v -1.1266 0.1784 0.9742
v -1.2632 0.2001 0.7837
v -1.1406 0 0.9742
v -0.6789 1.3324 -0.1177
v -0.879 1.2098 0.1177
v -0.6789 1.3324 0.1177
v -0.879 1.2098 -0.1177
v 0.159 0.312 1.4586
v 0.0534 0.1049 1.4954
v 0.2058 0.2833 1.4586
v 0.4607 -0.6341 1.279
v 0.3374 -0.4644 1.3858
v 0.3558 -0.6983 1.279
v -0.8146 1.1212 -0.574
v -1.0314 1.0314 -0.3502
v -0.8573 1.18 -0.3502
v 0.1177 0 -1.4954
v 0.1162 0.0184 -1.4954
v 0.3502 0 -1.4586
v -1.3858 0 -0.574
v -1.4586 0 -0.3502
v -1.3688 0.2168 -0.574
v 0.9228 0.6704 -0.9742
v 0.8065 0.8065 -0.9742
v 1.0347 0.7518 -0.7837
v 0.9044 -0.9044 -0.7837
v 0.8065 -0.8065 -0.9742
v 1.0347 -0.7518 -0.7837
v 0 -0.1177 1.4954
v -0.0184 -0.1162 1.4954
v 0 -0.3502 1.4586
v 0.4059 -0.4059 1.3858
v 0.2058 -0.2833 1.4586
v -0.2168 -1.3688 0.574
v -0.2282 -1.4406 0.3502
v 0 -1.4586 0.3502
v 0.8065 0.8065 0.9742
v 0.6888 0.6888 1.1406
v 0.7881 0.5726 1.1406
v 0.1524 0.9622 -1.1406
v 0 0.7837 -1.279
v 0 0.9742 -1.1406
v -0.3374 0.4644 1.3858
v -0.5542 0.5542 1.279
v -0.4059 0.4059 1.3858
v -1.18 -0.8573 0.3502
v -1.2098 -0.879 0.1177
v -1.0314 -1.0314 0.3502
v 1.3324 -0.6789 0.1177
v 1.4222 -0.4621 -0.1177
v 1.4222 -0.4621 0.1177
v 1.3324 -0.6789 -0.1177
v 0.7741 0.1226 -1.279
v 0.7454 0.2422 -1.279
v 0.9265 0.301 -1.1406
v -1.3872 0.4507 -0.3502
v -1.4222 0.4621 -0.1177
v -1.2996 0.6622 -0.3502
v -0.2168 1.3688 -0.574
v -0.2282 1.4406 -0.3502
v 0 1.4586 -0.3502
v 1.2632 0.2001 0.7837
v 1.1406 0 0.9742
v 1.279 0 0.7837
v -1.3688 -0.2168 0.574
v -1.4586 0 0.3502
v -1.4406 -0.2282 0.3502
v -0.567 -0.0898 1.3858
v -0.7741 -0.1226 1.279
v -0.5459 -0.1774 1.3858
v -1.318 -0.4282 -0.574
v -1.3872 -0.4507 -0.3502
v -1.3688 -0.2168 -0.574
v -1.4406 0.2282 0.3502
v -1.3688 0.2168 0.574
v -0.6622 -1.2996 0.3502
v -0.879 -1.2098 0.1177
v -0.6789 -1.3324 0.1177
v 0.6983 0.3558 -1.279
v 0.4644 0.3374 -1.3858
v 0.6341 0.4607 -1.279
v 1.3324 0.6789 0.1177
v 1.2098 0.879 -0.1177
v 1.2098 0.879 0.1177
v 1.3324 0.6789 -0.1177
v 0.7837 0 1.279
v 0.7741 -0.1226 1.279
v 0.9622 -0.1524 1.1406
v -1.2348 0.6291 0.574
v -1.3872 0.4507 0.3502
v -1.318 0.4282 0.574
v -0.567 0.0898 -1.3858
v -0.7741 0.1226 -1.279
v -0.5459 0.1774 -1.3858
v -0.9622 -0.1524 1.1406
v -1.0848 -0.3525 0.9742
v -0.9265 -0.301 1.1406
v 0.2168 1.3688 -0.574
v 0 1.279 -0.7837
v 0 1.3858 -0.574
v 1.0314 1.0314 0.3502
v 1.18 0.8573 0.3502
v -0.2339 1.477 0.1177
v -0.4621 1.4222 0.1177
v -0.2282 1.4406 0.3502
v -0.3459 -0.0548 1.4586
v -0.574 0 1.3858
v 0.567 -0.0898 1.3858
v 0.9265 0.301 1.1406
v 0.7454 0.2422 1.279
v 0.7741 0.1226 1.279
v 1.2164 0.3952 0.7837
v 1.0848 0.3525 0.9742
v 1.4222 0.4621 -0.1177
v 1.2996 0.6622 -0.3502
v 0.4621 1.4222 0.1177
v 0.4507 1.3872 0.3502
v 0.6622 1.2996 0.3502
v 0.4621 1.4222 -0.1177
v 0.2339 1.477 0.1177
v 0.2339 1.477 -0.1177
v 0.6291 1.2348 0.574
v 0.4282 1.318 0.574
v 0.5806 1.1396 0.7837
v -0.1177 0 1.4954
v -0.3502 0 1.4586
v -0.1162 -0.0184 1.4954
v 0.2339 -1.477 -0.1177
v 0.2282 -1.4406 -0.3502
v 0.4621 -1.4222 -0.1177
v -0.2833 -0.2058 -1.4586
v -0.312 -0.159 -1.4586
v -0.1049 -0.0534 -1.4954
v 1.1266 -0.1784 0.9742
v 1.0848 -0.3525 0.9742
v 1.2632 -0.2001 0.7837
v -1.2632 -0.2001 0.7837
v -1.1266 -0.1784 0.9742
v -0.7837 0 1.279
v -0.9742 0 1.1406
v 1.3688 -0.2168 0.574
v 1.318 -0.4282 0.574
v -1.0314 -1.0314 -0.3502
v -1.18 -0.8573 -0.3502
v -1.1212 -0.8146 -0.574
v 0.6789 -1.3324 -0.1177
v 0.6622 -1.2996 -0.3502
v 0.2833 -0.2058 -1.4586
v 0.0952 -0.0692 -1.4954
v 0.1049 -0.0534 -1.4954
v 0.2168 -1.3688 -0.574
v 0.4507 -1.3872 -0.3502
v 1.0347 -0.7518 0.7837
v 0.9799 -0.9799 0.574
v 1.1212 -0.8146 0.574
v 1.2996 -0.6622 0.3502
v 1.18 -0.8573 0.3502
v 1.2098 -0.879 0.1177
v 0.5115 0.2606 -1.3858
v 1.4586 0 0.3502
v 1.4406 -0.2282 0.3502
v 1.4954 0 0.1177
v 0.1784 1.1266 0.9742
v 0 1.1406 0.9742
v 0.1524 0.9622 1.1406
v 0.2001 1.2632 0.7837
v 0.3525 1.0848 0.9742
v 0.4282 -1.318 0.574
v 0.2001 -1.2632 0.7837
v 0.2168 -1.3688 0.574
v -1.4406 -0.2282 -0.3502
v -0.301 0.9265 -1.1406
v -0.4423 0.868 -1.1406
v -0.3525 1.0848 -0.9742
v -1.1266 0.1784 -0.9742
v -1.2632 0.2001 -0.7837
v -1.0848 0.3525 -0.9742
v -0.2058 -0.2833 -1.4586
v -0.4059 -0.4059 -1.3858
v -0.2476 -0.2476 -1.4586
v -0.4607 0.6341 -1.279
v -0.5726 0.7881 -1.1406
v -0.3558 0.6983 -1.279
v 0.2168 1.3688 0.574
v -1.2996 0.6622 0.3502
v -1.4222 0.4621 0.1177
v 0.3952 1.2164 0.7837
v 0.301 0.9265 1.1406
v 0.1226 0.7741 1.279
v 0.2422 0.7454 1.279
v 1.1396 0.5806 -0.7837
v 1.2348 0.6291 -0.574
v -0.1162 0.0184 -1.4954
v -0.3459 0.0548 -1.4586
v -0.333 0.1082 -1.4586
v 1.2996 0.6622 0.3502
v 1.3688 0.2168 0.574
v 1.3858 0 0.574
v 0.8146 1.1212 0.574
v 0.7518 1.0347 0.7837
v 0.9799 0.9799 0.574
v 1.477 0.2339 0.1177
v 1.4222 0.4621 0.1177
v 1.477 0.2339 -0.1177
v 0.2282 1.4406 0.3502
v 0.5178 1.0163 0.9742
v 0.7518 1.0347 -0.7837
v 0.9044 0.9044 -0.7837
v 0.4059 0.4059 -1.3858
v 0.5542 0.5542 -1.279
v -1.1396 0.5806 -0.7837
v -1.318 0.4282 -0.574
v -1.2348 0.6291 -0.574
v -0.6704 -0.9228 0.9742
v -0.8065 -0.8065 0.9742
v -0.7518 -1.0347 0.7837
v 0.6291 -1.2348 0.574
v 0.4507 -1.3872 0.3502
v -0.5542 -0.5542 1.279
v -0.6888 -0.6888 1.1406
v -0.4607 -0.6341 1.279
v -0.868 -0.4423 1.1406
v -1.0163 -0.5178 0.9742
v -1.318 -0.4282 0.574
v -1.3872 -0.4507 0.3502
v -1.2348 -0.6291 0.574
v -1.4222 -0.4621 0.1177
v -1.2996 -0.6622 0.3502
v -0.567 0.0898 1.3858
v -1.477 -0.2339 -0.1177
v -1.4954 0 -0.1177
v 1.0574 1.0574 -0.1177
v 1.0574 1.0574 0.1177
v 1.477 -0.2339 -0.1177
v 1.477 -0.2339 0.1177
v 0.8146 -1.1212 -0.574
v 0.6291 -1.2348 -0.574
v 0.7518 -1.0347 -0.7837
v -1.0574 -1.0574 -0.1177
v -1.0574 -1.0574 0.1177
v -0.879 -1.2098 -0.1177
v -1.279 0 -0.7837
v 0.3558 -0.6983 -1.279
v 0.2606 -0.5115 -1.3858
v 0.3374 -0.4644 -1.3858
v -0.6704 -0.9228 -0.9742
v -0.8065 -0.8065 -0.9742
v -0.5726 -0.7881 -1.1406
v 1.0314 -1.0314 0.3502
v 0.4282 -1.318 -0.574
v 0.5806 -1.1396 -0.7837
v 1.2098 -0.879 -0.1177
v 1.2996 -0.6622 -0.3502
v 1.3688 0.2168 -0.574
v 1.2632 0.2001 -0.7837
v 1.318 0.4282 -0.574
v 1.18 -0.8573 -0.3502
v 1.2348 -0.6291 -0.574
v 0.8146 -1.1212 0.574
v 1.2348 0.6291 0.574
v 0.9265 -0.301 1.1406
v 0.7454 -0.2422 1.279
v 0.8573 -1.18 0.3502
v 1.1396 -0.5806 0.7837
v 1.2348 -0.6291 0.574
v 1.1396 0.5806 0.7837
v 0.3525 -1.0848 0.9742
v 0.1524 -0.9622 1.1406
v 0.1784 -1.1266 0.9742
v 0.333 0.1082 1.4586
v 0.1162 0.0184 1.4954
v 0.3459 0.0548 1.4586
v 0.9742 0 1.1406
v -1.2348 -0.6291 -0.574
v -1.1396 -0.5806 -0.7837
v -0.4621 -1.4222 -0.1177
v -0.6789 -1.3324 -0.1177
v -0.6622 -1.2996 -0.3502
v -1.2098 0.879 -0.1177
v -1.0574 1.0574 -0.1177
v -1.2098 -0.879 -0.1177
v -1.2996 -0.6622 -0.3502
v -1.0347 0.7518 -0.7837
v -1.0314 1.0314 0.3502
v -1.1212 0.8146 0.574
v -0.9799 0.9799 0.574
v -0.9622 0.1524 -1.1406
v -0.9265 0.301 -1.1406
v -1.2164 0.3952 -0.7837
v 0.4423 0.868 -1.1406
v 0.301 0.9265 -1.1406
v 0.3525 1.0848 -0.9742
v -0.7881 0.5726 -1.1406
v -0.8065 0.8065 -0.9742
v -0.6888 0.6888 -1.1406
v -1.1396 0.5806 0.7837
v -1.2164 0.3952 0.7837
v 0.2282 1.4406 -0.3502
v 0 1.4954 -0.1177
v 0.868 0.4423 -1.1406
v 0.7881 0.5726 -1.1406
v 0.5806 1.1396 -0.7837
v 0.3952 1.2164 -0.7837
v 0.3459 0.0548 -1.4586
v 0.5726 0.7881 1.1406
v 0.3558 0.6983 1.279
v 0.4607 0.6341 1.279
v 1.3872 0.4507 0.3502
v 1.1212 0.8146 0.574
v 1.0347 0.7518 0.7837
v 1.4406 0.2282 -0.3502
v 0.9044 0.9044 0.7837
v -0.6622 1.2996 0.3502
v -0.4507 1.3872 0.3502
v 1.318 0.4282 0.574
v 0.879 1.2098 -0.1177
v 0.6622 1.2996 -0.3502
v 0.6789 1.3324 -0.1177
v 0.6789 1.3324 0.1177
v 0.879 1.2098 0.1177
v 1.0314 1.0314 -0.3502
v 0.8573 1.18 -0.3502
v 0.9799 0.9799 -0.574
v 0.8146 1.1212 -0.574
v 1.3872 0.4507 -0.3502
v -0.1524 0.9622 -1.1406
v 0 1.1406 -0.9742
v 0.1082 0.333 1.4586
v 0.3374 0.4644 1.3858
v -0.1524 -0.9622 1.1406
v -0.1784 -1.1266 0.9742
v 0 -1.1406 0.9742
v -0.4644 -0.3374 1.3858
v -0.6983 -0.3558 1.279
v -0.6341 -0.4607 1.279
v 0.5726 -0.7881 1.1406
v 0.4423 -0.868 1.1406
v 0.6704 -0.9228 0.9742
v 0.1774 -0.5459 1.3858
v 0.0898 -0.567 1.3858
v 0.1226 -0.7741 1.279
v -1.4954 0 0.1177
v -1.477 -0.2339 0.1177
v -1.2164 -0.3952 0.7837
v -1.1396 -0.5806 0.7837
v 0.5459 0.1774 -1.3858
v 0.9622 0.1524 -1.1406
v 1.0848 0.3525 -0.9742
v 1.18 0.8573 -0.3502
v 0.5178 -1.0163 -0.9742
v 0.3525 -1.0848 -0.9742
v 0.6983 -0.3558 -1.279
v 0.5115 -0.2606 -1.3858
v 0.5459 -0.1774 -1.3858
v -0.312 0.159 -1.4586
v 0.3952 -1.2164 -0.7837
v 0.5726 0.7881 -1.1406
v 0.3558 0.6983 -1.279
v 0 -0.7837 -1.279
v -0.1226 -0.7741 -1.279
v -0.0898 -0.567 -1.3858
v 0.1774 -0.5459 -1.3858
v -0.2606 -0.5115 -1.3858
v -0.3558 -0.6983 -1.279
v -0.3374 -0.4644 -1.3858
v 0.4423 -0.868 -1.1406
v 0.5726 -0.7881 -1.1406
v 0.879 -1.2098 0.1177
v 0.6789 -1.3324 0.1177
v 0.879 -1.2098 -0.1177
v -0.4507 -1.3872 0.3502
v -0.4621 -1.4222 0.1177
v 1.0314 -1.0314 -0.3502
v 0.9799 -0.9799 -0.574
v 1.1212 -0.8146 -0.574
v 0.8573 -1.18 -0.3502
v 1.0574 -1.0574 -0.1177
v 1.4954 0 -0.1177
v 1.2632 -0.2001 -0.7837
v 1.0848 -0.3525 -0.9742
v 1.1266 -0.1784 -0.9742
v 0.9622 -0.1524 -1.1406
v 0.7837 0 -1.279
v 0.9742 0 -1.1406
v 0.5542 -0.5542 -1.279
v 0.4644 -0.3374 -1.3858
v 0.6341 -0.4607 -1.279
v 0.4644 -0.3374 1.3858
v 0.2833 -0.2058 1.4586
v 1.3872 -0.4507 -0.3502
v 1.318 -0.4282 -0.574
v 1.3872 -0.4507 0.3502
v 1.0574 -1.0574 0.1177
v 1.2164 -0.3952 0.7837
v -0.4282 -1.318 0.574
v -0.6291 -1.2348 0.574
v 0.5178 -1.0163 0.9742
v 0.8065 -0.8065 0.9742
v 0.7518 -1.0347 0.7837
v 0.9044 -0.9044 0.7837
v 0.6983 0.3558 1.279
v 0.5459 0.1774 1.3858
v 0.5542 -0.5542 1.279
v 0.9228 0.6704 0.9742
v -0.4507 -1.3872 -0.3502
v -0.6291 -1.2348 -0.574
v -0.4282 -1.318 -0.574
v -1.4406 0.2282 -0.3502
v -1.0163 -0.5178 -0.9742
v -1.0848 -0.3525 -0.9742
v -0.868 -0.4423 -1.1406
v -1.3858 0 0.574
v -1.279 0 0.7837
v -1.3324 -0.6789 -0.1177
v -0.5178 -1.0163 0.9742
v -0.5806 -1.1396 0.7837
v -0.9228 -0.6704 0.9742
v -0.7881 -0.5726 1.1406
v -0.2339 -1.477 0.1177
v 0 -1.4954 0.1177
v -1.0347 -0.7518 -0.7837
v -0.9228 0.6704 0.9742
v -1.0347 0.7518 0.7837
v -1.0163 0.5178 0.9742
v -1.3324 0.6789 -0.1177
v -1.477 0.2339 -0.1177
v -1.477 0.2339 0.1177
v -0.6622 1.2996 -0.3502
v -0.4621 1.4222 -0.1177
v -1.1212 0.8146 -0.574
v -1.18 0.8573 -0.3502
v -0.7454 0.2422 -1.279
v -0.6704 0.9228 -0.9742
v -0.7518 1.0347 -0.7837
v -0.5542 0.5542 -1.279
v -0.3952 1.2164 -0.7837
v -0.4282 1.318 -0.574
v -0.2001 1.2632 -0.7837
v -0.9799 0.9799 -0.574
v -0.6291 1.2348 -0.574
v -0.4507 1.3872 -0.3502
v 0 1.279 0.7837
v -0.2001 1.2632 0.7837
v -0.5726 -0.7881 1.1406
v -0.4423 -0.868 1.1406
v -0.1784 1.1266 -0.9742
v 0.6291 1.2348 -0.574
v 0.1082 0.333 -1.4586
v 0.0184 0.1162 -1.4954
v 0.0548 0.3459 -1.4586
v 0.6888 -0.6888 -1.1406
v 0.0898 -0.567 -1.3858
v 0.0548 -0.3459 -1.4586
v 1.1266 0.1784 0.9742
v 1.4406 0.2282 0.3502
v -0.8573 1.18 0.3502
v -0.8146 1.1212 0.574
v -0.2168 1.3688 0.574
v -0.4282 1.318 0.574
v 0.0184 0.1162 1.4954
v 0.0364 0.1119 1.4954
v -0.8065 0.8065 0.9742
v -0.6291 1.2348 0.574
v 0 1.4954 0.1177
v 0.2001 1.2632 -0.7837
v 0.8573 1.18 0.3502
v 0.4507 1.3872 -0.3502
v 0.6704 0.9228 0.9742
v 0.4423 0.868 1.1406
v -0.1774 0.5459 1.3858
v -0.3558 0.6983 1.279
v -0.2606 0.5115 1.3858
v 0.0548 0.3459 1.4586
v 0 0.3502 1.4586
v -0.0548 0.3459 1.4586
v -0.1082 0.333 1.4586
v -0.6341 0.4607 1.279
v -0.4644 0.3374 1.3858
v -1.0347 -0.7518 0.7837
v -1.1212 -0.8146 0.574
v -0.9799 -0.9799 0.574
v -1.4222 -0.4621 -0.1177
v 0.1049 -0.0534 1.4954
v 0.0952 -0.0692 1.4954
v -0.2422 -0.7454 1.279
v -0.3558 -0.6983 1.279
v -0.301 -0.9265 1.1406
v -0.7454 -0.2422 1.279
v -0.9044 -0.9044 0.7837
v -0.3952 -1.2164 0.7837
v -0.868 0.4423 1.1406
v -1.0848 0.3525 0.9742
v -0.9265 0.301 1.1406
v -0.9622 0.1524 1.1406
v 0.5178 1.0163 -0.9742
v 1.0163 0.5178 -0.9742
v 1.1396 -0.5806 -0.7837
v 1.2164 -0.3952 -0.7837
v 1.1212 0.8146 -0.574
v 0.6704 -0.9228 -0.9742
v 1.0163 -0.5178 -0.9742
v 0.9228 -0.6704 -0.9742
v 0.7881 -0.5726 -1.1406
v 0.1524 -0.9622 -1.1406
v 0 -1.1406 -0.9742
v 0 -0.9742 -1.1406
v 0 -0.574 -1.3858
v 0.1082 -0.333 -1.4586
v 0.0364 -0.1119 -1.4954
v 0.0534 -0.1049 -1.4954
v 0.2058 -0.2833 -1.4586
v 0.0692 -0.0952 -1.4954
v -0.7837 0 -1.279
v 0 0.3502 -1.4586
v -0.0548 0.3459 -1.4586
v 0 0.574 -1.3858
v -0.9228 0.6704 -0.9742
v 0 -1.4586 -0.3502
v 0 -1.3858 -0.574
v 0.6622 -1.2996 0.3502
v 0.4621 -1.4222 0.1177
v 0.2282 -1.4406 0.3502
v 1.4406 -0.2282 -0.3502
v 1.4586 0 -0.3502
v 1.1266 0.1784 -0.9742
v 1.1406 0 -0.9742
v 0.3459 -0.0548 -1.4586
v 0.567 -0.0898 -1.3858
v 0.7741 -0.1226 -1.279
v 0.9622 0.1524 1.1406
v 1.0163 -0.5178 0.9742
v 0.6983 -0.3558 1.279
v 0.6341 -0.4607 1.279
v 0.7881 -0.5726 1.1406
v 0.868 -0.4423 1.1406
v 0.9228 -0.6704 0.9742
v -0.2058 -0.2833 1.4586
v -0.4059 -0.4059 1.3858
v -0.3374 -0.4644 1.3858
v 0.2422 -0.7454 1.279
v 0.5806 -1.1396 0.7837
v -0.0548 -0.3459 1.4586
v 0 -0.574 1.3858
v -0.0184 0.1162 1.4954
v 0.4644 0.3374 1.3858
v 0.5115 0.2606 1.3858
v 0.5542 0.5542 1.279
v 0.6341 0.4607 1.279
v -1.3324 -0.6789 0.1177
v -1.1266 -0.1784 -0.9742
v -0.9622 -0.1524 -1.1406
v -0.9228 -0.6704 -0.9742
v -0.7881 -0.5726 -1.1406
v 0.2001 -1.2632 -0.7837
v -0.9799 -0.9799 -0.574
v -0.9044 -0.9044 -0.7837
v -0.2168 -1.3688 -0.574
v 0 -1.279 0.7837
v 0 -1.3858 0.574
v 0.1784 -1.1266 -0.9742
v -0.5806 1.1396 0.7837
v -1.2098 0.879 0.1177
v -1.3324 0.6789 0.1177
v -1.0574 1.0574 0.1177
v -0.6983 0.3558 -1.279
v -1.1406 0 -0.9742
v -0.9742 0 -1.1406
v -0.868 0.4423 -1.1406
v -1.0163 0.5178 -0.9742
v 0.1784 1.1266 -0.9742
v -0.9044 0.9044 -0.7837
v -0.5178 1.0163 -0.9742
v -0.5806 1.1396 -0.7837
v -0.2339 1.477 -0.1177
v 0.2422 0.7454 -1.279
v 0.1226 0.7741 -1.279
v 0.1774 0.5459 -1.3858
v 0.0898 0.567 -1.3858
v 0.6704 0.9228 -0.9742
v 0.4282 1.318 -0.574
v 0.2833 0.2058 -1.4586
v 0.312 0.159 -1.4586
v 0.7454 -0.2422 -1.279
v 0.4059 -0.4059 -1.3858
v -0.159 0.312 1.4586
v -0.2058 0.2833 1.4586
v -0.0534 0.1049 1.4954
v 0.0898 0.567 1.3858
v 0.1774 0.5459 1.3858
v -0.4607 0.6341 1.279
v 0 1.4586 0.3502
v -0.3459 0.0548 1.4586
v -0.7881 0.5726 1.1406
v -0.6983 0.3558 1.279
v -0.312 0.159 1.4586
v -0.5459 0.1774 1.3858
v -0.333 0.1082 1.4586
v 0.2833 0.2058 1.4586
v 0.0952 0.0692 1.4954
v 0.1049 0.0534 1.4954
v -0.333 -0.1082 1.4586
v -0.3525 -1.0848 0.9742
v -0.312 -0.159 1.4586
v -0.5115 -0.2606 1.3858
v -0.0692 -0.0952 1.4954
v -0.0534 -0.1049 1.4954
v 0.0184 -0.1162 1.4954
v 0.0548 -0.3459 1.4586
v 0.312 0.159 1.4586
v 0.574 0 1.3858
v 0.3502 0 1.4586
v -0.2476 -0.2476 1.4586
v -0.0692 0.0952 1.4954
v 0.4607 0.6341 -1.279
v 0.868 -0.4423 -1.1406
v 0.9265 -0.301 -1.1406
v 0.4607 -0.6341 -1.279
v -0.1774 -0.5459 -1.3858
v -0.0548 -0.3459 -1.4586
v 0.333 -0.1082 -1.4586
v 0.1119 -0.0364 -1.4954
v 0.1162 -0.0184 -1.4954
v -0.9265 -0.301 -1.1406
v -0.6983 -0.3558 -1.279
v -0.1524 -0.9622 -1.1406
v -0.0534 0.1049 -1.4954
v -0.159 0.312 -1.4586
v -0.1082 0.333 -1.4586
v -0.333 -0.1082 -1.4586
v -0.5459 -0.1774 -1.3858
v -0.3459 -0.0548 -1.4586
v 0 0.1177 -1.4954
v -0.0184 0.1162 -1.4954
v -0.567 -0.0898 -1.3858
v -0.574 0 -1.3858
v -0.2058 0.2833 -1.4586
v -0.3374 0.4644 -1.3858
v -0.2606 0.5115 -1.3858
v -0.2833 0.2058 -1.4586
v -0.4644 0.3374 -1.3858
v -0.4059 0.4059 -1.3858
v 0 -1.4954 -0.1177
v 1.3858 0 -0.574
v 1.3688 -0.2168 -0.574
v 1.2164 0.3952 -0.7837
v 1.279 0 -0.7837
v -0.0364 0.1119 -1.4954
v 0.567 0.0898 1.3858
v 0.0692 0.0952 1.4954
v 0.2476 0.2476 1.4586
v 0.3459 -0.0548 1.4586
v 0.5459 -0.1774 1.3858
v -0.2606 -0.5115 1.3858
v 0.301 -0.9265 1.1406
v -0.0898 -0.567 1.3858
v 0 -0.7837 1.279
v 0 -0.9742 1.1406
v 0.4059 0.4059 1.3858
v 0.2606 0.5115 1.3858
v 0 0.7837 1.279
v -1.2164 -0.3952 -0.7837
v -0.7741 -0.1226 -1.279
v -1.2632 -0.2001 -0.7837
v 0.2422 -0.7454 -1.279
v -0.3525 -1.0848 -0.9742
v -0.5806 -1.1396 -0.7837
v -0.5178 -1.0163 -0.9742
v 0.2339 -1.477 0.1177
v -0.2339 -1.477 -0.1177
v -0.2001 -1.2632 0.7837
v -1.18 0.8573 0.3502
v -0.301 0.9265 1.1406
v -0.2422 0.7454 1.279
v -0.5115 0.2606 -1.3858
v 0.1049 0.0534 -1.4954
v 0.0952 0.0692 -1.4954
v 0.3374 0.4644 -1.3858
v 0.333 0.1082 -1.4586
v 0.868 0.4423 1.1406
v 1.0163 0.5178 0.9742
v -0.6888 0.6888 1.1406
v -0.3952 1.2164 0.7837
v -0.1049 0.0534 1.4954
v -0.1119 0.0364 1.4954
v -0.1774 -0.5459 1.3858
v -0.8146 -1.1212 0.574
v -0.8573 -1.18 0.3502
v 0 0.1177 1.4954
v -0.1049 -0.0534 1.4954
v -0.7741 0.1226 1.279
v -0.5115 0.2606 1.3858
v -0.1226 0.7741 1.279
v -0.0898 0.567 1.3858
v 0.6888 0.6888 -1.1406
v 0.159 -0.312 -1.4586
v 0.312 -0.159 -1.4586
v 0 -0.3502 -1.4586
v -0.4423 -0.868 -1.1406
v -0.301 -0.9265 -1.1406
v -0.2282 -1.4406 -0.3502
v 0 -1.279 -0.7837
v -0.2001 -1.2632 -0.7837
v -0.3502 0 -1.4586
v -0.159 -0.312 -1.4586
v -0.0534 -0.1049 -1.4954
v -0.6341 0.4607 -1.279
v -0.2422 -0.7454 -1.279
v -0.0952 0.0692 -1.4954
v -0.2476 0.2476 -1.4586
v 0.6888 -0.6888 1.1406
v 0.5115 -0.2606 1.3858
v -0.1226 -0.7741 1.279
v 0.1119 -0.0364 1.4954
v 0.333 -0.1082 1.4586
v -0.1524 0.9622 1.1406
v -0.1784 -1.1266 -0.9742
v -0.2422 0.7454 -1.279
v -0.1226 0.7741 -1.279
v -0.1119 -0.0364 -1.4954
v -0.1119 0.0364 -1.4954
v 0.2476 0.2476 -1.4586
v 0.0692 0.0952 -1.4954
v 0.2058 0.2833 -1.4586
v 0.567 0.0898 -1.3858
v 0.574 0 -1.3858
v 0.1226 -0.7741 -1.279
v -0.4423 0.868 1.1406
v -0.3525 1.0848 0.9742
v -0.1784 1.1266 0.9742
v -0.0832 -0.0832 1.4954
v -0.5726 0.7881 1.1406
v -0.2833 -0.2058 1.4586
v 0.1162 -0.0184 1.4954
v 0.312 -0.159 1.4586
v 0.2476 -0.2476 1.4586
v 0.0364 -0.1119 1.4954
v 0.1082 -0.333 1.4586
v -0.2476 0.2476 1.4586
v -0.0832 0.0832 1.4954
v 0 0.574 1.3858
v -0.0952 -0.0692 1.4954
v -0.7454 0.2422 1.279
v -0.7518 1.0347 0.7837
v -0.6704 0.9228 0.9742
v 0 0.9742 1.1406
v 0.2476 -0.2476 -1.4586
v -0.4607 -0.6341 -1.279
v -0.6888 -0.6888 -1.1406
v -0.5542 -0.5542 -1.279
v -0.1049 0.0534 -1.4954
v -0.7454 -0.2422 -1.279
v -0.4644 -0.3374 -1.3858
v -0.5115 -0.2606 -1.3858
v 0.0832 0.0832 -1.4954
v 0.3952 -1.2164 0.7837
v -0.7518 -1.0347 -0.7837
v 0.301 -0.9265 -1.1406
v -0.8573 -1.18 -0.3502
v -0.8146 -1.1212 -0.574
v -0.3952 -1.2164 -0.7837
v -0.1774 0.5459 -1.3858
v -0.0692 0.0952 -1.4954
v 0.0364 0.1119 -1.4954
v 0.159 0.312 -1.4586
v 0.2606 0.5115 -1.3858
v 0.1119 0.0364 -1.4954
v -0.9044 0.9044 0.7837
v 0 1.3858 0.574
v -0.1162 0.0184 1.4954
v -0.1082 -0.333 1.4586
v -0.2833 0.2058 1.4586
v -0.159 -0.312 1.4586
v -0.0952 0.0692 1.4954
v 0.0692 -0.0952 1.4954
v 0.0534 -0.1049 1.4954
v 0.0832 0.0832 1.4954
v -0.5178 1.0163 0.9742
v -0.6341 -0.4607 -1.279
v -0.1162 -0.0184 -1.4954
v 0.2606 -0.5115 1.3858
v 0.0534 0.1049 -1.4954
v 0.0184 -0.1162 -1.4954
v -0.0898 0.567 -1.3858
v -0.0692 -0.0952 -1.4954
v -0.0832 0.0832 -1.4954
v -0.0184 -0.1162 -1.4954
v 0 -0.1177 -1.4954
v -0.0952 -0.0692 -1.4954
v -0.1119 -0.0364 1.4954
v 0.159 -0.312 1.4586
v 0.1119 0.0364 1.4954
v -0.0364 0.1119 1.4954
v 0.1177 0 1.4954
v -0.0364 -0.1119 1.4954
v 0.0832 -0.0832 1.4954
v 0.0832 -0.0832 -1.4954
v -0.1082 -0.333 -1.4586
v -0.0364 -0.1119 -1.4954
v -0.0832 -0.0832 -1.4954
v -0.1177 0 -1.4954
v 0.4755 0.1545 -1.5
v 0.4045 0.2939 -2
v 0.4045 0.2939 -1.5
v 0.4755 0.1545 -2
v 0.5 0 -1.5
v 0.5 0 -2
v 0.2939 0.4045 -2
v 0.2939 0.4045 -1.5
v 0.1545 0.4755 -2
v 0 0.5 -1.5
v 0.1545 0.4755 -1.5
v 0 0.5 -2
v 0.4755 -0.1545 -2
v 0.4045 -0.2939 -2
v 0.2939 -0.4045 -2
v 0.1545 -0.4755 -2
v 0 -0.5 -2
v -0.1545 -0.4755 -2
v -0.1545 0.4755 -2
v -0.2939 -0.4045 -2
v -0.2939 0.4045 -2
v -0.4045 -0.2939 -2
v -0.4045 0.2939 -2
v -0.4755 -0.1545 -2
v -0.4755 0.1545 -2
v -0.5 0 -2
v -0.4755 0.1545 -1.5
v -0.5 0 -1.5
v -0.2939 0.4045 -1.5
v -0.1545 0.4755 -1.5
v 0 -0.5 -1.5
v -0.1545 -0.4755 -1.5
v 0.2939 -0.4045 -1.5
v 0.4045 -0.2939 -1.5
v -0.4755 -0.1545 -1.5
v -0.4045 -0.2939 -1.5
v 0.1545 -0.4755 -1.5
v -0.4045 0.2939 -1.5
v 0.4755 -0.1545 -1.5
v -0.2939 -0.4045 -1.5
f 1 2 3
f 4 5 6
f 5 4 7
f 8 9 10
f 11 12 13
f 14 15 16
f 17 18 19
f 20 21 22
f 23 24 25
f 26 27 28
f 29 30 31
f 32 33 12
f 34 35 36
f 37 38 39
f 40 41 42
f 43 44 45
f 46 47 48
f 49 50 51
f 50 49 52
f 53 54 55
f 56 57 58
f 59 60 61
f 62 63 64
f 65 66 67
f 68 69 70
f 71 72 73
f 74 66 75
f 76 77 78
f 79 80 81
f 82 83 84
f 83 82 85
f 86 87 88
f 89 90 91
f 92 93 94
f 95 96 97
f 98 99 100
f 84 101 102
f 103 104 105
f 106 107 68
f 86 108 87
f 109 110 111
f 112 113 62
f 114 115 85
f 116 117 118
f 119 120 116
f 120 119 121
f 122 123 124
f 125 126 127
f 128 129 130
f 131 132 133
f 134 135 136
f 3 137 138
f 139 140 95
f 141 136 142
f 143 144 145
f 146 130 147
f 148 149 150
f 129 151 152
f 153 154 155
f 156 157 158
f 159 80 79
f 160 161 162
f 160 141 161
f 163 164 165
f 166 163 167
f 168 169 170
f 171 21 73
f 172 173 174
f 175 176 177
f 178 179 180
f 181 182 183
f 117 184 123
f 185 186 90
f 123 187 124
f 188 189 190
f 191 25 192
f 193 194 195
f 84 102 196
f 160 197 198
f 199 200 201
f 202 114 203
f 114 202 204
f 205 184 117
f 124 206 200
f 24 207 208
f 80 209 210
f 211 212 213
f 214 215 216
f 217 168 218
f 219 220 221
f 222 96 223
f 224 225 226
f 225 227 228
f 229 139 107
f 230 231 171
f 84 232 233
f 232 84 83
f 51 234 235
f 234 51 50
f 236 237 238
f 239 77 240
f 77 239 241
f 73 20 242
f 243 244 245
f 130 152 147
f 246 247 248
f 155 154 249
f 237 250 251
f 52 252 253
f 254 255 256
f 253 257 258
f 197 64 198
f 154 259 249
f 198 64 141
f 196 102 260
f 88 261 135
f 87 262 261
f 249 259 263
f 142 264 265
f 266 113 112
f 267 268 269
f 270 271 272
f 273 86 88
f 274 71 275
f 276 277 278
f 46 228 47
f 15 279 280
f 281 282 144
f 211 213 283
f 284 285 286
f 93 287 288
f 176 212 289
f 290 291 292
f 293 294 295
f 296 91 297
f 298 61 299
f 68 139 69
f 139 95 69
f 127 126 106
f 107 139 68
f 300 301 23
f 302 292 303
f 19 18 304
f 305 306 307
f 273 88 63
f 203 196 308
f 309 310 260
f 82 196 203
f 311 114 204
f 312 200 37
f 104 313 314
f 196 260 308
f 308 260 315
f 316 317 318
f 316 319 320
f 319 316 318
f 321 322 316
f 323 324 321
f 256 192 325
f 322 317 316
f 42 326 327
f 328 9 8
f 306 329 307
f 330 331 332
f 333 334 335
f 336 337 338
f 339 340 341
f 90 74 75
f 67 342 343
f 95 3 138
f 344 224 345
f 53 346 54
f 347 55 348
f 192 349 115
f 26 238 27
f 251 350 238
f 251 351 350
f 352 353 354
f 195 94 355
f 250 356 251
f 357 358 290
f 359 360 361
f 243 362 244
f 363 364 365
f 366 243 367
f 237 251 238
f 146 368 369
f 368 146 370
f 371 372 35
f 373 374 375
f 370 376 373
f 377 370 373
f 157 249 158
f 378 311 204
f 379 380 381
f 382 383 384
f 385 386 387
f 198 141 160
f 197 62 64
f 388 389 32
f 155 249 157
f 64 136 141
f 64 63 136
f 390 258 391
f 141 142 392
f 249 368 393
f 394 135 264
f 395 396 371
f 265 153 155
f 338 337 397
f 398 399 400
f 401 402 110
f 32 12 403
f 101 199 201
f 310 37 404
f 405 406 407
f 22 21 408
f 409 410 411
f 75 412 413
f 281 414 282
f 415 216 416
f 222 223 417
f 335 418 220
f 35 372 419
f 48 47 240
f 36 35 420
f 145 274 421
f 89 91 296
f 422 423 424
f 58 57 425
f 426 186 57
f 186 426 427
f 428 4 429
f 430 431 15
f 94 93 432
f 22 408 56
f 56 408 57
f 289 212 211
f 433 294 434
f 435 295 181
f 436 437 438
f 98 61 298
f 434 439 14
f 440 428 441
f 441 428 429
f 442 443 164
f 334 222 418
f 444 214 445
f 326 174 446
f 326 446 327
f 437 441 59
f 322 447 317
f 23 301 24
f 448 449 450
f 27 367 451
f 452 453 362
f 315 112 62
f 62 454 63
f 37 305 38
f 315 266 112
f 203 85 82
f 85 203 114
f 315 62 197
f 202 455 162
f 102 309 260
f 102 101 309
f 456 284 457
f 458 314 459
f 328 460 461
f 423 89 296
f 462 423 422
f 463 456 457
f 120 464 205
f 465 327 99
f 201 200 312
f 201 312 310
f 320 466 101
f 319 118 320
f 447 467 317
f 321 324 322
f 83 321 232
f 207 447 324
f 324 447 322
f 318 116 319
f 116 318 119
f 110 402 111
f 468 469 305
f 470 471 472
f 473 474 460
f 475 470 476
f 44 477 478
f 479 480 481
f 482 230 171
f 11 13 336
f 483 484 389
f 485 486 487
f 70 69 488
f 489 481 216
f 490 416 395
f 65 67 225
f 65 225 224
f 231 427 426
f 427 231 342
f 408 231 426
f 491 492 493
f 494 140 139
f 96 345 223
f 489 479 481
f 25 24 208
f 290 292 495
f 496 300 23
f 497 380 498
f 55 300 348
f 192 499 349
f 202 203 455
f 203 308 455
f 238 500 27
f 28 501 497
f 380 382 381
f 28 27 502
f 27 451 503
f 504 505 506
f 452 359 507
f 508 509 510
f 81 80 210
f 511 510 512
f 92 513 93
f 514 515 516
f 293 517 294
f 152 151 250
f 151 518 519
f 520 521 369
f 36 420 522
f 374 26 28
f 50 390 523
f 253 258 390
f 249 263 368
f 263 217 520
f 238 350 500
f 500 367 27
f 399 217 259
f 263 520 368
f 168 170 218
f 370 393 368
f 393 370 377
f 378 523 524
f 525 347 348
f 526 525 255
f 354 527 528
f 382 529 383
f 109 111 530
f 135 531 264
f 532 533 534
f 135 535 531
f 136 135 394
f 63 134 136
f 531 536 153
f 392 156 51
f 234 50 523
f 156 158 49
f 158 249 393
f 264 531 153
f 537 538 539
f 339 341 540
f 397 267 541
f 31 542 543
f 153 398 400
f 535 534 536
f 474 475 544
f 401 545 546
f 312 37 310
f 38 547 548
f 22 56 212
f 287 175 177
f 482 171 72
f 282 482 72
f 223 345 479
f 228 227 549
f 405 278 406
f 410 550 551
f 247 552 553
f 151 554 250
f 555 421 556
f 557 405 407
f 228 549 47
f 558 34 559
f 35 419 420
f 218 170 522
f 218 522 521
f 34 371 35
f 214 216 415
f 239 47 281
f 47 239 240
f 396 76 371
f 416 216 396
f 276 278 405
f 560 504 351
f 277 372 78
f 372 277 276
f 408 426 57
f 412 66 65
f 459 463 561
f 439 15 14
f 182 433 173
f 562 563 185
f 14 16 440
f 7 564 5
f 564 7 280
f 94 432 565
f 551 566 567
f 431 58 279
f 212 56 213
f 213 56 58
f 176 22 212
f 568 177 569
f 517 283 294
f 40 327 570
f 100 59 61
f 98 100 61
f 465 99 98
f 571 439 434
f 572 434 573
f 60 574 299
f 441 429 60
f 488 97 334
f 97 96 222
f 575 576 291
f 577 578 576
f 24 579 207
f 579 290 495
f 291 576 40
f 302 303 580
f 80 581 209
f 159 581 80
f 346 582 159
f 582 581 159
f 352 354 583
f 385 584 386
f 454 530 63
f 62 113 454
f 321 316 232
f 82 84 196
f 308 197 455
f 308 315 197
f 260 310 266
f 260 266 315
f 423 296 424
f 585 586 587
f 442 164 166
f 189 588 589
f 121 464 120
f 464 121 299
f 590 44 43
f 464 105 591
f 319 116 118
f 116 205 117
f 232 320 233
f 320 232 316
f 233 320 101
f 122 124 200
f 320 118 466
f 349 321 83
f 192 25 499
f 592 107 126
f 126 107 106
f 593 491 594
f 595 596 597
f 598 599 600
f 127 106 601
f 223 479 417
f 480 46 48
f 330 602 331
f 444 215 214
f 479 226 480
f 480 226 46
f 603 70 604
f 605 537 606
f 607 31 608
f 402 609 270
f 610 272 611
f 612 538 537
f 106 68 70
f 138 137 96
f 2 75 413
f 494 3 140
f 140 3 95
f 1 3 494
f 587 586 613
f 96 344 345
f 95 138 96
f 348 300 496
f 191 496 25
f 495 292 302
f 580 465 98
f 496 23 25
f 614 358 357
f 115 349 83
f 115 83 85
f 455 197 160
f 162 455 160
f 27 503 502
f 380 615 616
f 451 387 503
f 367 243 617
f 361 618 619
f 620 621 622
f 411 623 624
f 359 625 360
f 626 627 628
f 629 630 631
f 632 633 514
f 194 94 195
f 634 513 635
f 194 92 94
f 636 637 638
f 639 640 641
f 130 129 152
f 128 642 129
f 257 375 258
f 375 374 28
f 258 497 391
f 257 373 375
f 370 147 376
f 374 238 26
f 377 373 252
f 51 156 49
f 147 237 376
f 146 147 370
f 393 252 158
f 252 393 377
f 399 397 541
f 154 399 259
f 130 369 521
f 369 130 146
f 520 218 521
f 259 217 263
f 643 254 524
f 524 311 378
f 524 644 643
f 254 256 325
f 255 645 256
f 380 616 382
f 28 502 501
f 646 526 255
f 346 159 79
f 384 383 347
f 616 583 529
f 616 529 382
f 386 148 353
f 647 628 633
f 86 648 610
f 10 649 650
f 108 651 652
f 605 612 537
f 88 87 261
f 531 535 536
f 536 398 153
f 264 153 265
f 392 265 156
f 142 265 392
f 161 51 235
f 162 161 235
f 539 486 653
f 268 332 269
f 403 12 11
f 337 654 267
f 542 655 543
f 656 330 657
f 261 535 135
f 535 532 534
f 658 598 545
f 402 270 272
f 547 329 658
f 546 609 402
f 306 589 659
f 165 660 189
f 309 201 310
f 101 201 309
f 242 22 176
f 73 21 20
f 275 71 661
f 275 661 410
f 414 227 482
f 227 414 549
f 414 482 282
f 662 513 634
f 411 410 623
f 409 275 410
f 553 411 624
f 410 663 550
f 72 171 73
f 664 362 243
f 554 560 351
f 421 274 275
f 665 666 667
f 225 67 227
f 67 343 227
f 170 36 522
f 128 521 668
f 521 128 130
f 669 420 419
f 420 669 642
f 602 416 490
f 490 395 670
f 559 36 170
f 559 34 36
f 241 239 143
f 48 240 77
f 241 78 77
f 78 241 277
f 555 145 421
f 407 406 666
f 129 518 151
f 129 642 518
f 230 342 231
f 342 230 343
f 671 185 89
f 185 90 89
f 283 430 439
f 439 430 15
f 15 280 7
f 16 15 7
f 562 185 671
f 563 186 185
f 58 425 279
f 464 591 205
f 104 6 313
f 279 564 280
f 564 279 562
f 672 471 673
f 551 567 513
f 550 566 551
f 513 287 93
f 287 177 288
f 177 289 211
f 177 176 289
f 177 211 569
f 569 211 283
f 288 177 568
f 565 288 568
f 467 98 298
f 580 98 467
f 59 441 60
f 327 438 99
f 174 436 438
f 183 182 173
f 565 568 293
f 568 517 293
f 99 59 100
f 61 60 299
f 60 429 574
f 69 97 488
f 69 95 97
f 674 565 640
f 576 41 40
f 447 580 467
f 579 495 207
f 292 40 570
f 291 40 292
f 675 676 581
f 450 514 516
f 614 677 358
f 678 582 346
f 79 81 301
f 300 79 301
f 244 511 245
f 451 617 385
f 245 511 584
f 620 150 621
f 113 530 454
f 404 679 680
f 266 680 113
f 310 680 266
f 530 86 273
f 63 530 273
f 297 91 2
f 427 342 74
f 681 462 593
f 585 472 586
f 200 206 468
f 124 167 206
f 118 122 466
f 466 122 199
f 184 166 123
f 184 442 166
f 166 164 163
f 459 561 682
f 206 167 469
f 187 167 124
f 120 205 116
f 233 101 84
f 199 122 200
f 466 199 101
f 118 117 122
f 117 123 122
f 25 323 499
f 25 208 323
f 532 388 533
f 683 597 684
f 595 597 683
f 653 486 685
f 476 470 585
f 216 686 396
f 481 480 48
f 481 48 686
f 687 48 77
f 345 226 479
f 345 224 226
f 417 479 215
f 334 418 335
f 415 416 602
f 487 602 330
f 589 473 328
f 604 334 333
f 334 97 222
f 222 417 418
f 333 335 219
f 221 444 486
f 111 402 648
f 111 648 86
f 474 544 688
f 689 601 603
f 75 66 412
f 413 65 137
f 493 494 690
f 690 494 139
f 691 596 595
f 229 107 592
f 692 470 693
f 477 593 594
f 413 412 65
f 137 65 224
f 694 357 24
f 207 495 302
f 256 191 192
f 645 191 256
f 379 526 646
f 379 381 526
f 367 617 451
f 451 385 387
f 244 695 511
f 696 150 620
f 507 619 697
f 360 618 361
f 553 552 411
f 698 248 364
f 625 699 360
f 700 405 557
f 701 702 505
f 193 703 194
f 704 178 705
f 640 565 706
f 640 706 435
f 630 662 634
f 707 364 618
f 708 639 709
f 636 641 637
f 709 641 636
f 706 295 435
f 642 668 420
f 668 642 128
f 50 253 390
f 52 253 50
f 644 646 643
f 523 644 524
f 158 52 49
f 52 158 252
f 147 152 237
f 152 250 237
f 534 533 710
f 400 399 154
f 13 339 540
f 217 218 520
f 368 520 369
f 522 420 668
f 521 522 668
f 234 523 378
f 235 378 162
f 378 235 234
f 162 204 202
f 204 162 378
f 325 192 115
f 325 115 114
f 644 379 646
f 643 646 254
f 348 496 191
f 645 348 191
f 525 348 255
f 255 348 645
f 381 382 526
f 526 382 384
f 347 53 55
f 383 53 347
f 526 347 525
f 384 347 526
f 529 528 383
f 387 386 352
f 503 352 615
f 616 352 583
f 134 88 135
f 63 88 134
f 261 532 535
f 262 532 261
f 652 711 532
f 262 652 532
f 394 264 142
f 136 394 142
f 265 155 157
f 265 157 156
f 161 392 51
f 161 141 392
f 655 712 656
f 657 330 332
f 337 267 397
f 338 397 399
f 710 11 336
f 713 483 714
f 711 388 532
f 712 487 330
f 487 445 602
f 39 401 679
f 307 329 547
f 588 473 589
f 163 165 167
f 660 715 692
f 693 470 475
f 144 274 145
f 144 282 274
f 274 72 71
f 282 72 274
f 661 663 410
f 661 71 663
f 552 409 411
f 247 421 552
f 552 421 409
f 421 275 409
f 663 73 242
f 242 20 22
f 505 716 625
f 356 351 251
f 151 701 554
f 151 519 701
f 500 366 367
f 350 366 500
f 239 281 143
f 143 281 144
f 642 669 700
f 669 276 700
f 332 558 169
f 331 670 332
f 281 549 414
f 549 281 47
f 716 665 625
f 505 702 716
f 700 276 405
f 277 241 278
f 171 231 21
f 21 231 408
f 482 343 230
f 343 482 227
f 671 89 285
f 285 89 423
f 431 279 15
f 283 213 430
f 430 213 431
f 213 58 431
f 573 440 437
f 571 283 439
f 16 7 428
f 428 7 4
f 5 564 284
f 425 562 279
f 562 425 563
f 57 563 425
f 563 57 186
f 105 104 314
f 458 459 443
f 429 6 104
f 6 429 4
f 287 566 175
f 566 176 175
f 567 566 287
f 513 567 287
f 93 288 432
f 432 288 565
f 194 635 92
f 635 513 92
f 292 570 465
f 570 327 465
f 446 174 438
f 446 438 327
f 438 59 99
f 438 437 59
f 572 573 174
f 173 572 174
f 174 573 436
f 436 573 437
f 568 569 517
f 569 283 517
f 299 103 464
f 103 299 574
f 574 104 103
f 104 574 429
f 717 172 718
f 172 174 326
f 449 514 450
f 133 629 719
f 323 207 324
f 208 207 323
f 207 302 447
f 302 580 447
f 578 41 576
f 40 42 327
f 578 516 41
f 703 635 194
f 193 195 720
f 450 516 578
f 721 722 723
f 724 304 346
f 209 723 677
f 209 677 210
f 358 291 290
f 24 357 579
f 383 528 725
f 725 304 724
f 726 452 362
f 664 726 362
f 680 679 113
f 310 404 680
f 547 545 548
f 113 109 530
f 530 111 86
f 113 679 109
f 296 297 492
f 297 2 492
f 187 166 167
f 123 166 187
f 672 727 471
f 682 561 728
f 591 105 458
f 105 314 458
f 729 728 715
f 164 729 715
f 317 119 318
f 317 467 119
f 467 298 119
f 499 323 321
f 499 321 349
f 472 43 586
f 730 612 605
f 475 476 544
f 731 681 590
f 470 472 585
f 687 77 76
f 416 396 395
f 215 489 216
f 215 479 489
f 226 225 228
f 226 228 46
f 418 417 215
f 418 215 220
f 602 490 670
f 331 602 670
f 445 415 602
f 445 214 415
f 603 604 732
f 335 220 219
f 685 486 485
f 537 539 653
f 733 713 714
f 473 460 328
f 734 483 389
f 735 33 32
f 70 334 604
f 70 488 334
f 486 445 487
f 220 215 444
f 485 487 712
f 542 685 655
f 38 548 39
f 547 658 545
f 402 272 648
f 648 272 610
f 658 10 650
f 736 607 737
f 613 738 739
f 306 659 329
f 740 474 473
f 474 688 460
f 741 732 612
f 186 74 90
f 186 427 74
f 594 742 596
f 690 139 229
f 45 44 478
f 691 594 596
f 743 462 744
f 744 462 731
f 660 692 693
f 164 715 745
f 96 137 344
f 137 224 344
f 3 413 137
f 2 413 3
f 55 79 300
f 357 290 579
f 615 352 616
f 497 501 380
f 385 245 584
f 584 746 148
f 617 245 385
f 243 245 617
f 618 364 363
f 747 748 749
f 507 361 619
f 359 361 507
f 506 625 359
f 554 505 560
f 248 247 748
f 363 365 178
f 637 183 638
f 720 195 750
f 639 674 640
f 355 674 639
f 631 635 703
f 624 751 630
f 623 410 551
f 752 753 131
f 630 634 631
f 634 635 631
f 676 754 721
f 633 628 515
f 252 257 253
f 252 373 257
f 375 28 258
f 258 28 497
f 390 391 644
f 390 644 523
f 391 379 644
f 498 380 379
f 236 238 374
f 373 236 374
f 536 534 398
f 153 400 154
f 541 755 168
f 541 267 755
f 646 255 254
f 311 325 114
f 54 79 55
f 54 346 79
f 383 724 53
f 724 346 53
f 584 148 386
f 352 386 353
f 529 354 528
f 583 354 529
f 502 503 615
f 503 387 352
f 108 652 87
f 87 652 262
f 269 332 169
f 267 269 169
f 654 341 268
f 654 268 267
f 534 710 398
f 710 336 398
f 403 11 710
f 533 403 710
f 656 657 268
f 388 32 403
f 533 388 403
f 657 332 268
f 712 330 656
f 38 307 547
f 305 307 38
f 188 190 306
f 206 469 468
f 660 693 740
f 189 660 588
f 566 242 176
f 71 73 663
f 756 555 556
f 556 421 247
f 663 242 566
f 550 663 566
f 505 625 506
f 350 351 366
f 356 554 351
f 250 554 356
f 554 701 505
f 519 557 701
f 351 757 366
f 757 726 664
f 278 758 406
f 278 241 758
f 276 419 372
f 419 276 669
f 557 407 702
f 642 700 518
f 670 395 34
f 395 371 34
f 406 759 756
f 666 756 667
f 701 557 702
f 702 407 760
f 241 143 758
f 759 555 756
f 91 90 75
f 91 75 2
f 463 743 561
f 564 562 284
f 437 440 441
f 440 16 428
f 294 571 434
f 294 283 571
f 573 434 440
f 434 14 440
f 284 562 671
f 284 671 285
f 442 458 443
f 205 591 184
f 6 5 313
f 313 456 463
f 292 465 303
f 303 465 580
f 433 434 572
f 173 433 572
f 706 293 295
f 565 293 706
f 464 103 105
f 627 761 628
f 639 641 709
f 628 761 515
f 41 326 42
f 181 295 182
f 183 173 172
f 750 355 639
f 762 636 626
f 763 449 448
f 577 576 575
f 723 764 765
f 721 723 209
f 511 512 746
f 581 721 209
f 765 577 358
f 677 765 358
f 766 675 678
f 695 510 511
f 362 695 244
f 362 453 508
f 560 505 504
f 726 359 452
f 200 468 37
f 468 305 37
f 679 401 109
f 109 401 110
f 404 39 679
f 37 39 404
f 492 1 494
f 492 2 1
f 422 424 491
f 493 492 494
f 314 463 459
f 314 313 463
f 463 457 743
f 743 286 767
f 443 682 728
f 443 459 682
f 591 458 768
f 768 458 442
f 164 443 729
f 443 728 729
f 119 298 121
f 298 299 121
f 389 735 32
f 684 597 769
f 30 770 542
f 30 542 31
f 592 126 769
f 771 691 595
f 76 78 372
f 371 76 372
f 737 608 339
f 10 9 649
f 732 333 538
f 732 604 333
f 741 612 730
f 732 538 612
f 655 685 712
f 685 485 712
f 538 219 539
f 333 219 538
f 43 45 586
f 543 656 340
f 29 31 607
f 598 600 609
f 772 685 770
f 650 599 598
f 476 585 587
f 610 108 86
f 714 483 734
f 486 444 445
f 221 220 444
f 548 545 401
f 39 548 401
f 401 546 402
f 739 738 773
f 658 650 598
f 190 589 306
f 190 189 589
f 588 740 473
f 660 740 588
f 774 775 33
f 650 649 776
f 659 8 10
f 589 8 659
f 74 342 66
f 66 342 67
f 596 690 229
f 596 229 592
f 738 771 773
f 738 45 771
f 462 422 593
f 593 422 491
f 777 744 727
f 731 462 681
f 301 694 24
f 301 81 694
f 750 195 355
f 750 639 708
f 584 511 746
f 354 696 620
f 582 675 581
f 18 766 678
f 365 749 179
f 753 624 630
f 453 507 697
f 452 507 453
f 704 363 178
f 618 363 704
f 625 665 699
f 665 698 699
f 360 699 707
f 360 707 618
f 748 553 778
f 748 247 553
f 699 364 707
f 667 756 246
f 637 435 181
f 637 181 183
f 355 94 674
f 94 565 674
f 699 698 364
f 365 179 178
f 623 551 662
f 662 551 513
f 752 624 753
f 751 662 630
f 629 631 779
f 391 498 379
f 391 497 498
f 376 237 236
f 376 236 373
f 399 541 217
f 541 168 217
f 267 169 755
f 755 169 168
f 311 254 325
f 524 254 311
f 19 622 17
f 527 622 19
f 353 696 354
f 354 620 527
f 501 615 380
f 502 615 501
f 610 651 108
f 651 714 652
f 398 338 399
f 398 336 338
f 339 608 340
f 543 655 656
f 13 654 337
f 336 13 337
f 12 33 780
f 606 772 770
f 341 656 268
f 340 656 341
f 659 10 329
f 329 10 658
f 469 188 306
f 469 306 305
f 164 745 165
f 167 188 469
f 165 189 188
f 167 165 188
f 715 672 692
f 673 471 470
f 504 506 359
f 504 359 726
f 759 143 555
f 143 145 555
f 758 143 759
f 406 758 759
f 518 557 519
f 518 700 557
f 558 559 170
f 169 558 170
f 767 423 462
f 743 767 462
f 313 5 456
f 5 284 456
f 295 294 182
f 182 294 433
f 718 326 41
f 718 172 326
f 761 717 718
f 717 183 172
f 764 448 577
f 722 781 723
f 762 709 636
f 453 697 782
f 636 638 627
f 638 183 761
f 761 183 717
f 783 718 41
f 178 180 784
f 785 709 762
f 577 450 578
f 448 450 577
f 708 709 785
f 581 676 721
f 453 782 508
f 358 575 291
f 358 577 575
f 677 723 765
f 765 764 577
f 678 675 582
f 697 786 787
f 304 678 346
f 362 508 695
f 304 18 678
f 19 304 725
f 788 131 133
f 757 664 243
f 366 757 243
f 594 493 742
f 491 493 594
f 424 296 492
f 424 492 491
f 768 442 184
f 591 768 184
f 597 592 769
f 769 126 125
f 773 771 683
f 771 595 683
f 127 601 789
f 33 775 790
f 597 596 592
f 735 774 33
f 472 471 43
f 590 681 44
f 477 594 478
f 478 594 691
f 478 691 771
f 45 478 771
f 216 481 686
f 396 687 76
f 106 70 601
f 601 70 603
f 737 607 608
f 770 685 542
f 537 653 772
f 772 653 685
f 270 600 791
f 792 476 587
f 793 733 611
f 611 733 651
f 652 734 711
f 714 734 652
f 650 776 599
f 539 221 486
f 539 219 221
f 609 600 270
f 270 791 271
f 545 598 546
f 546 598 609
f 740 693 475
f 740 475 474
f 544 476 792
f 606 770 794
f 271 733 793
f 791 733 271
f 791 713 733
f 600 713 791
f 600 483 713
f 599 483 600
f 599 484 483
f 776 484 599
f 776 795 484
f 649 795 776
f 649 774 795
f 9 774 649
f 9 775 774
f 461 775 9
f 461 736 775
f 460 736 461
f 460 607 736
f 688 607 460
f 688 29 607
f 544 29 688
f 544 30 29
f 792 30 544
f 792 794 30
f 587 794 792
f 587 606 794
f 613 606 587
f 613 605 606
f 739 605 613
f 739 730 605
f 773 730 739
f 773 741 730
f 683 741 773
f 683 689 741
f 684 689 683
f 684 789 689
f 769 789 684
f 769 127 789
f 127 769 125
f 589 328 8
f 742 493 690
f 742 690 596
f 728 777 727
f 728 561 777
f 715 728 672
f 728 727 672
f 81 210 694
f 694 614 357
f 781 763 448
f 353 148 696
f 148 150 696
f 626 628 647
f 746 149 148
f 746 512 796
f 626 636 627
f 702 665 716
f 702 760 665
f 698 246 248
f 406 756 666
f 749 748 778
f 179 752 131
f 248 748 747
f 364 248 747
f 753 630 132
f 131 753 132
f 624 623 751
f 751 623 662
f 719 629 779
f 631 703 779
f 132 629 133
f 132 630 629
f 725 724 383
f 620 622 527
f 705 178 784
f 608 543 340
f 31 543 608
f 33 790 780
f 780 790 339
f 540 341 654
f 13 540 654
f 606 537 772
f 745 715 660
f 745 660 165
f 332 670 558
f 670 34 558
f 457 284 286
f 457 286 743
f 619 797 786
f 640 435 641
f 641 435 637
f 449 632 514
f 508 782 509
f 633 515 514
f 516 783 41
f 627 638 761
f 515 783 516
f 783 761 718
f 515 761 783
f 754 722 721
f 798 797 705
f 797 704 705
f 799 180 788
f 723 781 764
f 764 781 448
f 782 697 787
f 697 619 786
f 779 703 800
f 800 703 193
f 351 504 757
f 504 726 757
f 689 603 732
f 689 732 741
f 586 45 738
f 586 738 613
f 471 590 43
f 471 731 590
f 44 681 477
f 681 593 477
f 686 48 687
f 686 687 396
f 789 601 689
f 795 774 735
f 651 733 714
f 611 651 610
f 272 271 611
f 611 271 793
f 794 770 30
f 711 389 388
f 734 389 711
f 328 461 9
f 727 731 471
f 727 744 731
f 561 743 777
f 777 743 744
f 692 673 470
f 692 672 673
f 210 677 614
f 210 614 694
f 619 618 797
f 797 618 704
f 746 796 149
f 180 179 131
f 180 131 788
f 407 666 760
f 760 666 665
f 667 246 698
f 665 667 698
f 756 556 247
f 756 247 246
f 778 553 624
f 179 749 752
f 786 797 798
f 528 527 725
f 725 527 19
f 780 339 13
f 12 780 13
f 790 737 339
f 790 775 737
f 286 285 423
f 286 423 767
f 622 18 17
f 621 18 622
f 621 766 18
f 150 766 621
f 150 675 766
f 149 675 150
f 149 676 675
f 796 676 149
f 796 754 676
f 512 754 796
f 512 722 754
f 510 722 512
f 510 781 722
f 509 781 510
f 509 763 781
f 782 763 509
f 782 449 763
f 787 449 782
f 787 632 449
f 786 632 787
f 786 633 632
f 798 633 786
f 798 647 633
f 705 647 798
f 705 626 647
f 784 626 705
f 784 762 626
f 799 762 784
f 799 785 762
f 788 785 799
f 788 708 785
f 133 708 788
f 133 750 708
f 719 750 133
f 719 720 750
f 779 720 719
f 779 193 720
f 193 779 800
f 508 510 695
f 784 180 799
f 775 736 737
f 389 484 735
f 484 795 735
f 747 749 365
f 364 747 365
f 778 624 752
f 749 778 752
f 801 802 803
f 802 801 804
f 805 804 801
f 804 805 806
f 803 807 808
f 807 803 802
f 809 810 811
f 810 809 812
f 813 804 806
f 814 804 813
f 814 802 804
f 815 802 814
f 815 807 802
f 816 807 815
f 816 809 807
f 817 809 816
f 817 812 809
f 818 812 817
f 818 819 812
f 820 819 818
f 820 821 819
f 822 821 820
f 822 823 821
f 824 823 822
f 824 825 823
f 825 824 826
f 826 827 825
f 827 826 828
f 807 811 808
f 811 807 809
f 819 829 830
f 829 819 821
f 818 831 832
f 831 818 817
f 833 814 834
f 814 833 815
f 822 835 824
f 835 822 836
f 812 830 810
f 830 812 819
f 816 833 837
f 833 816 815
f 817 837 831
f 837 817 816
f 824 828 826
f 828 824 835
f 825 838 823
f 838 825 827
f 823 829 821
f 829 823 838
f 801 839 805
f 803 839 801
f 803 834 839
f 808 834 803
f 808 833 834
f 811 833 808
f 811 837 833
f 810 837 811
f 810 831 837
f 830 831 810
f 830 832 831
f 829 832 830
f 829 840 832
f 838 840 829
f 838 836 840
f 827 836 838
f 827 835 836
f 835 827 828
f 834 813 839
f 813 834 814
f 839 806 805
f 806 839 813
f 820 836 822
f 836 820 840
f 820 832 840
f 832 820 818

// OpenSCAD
// part_id: mar15
// name: Mars pointer orb small
// source_drawing_ids: DRW-013
// units: mm
// revision: 0.1
// SPDX-License-Identifier: MIT

module part_mar15(ball_d = 3.0, pin_d = 1.0, pin_l = 0.5) {
    union() {
        sphere(d = ball_d, $fn = 40);
        translate([0, 0, -ball_d / 2 - pin_l]) cylinder(d = pin_d, h = pin_l, $fn = 20);
    }
}

// ---- "main guard" ----
if (is_undef(__LIB_MODE__)) {
    part_mar15();
}
